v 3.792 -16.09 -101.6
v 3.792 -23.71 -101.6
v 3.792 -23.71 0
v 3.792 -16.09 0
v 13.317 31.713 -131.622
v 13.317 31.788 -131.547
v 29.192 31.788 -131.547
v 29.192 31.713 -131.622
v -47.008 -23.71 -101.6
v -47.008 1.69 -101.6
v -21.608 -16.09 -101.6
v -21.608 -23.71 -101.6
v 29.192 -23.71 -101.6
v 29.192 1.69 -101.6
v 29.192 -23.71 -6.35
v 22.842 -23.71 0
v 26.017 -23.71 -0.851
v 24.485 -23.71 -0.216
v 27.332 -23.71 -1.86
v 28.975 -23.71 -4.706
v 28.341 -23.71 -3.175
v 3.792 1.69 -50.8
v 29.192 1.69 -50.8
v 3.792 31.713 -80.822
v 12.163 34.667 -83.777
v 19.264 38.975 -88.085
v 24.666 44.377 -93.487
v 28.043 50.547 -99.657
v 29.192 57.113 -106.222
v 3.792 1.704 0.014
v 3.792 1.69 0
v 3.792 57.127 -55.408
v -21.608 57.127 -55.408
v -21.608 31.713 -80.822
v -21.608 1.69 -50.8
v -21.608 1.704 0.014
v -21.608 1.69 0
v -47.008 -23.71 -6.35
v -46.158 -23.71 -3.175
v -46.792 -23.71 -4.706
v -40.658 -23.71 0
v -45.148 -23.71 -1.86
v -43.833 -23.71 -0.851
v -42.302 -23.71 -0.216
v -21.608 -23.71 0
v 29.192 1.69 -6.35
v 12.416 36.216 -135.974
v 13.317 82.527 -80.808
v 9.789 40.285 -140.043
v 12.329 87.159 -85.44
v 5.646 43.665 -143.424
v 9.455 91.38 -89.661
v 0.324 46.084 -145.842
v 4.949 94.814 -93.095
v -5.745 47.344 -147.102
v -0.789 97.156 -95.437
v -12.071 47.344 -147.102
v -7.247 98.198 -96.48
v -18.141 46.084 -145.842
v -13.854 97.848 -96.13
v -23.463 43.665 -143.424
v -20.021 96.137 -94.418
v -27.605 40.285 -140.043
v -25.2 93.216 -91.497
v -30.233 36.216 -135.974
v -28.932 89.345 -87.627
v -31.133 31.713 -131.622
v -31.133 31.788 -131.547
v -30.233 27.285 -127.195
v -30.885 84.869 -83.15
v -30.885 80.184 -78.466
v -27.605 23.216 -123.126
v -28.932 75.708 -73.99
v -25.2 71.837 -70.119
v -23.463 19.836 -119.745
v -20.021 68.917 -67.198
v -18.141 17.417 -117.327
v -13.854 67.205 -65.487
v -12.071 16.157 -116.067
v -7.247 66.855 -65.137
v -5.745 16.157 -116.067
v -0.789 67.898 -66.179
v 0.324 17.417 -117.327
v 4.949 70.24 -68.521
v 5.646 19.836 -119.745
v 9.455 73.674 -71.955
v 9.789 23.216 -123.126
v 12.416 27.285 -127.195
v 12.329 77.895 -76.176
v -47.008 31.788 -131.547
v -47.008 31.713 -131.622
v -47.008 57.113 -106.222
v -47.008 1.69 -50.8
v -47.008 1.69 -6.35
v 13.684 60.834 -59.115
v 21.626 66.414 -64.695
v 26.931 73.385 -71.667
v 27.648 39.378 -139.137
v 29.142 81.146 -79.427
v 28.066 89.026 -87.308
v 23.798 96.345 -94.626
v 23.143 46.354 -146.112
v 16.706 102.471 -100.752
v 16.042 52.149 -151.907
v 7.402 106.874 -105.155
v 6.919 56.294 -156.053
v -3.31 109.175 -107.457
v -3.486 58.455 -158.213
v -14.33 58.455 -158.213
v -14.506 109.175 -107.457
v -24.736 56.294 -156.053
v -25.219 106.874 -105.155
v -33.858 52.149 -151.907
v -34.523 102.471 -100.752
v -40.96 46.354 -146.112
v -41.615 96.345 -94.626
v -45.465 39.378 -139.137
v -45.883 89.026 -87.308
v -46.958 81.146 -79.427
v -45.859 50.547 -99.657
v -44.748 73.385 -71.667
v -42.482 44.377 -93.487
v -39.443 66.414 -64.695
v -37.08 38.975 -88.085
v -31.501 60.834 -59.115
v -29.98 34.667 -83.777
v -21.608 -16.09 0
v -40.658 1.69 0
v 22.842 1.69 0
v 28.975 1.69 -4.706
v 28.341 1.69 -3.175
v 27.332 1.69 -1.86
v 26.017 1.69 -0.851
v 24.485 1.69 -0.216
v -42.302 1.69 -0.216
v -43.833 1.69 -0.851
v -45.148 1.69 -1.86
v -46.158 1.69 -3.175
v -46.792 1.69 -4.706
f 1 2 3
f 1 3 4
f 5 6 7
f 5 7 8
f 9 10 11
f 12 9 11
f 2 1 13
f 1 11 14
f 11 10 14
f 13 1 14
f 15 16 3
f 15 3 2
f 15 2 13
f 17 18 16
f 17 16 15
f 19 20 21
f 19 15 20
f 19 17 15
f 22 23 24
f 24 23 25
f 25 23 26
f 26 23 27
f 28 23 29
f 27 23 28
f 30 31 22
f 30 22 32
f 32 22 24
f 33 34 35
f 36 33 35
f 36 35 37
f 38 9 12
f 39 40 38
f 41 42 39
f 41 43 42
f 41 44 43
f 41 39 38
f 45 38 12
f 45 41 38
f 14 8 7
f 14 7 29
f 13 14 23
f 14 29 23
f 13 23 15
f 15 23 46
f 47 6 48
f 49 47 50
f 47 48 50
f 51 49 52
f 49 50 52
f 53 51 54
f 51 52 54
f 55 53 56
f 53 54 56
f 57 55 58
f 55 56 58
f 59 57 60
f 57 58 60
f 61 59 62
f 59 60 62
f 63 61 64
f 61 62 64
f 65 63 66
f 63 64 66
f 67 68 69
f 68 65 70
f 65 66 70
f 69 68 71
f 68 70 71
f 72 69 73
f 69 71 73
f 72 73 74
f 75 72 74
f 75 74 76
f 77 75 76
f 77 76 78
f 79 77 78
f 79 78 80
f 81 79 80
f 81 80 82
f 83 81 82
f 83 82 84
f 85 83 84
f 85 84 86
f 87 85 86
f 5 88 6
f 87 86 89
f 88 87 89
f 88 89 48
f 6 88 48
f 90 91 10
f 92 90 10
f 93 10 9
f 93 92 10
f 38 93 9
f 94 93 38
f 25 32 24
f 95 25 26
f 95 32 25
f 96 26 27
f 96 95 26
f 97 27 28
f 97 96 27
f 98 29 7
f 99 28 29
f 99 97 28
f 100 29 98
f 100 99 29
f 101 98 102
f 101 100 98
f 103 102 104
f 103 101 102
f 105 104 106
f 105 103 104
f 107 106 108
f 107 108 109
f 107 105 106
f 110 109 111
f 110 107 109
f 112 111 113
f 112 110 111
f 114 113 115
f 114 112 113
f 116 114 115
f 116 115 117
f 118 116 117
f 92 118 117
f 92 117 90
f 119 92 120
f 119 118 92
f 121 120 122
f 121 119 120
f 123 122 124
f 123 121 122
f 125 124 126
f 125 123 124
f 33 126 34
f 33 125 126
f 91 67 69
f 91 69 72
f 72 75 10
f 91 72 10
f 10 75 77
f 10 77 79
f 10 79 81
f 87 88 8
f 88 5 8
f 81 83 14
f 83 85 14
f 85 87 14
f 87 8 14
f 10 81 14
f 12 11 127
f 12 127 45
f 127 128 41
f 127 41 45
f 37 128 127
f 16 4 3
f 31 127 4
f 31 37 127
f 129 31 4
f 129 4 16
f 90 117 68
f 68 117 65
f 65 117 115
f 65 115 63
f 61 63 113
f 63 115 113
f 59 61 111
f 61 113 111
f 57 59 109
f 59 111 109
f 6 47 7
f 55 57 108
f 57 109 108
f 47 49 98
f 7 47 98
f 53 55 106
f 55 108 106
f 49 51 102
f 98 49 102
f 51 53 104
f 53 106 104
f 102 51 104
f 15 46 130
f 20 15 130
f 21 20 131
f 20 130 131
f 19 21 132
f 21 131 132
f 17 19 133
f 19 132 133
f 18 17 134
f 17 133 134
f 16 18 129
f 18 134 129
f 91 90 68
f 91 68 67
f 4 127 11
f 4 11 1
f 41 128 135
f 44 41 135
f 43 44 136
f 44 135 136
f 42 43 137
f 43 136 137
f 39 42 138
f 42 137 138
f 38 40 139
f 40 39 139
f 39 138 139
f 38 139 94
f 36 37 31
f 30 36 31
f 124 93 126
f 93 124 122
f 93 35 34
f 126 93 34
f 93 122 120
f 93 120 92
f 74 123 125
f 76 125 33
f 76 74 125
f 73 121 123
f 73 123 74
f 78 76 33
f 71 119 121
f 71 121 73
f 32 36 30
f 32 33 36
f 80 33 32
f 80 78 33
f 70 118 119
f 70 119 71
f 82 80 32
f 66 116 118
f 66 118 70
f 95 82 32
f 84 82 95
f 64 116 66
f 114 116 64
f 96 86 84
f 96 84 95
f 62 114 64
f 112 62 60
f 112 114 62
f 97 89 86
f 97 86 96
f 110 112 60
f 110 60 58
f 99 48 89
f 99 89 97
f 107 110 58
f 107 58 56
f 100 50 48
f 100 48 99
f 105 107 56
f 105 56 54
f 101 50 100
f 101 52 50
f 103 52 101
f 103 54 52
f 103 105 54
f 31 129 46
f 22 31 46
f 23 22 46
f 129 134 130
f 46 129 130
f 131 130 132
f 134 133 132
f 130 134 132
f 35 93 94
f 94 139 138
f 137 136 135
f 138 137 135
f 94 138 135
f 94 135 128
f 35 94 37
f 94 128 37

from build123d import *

# Parameters (mm, degrees)
SKETCH1_W                = 76.2
SKETCH1_H                = 25.4
BOSS_EXTRUDE1_DEPTH      = 101.6
BOSS_EXTRUDE2_DEPTH      = 76.2
BOSS_EXTRUDE3_DEPTH      = 35.941
BOSS_EXTRUDE3_DEPTH_BACK = 35.814
SKETCH5_R                = 22.225
CUT_EXTRUDE1_DEPTH       = 148.955
CUT_EXTRUDE2_DEPTH       = 51.724322261
CUT_EXTRUDE3_DEPTH       = 159.487395714


with BuildPart() as part:
    # Sketch1 → Boss-Extrude1 (new body)
    with BuildSketch(Plane.XY):
        with Locations((-8.908273381, -11.00971223)):
            Rectangle(SKETCH1_W, SKETCH1_H)
    extrude(amount=-BOSS_EXTRUDE1_DEPTH)

    # Sketch3 → Boss-Extrude2 (add, through all)
    with BuildSketch(Plane(origin=(29.191726619, 0, 0), x_dir=(0, 0, -1), z_dir=(1, 0, 0))):
        Polygon((50.8, 1.69028777), (106.22230509, 57.112592859), (131.62230509, 31.712592859), (101.6, 1.69028777), align=None)
    extrude(amount=-BOSS_EXTRUDE2_DEPTH)

    # Sketch4 → Boss-Extrude3 (add, two sides)
    with BuildSketch(Plane(origin=(0, -24.554856115, -24.554856115), x_dir=(1, 0, 0), z_dir=(0, 0.707106781, 0.707106781))) as boss_extrude3_sk:
        with BuildLine():
            Line((-21.608273381, 1.195213944), (3.791726619, 1.195213944))
            Line((3.791726619, 1.195213944), (3.791726619, 79.57418946))
            ThreePointArc((3.791726619, 79.57418946), (-8.908273381, 153.595213944), (-21.608273381, 79.57418946))
            Line((-21.608273381, 79.57418946), (-21.608273381, 1.195213944))
        make_face()
    extrude(amount=BOSS_EXTRUDE3_DEPTH)
    extrude(boss_extrude3_sk.sketch, amount=-BOSS_EXTRUDE3_DEPTH_BACK)

    # Sketch5 → Cut-Extrude1 (cut, through all)
    with BuildSketch(Plane(origin=(0, 0.859268708, 0.859268708), x_dir=(1, 0, 0), z_dir=(0, 0.707106781, 0.707106781))):
        with Locations((-8.908273381, 115.495213944)):
            Circle(SKETCH5_R)
    extrude(amount=-CUT_EXTRUDE1_DEPTH, mode=Mode.SUBTRACT)

    # Sketch6 → Cut-Extrude2 (cut, through all)
    with BuildSketch(Plane(origin=(0, 1.69028777, 0), x_dir=(1, 0, 0), z_dir=(0, 1, 0))):
        with BuildLine():
            Line((-47.008273381, 6.35), (-47.008273381, 0))
            Line((-47.008273381, 0), (-40.658273381, 0))
            ThreePointArc((-40.658273381, 0), (-45.148401442, 1.859871939), (-47.008273381, 6.35))
        make_face()
        with BuildLine():
            Line((22.841726619, 0), (29.191726619, 0))
            Line((29.191726619, 0), (29.191726619, 6.35))
            ThreePointArc((29.191726619, 6.35), (27.331854679, 1.859871939), (22.841726619, 0))
        make_face()
    extrude(amount=-CUT_EXTRUDE2_DEPTH, mode=Mode.SUBTRACT)

    # Sketch7 → Cut-Extrude3 (cut, through all)
    with BuildSketch(Plane.XY):
        Polygon((-21.608273381, -23.70971223), (-21.608273381, -16.08971223), (3.791726619, -16.08971223), (3.791726619, -23.70971223), (3.791726619, -49.034034492), (-21.608273381, -49.034034492), align=None)
    extrude(amount=-CUT_EXTRUDE3_DEPTH, mode=Mode.SUBTRACT)


solid = part.part
